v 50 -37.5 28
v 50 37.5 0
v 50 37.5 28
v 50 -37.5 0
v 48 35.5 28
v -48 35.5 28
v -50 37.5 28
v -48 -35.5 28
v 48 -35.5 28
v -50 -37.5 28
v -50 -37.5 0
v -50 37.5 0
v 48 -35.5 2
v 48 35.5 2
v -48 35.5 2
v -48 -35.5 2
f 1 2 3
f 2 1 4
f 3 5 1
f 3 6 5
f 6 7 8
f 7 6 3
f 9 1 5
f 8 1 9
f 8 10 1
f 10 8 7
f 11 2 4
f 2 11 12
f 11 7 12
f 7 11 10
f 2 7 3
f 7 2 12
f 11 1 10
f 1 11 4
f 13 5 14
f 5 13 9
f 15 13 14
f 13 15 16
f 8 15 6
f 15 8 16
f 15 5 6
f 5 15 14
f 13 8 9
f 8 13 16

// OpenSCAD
// Draft enclosure. Millimetres. Set part to "base" or "lid" before STL export.
part = "base";
length = 100;
width = 75;
wall = 2;
base_height = 28;
lid_thickness = 2;
clearance = 0.3; // Per side; adjust after printer fit test.
skirt_depth = 3;
skirt_wall = 1.2;
module base() {
    difference() {
        translate([-length/2,-width/2,0]) cube([length,width,base_height]);
        translate([-length/2+wall,-width/2+wall,wall])
            cube([length-2*wall,width-2*wall,base_height]);
    }
}
module lid() {
    sx=length-2*wall-2*clearance;
    sy=width-2*wall-2*clearance;
    union() {
        translate([-length/2,-width/2,0]) cube([length,width,lid_thickness]);
        difference() {
            translate([-sx/2,-sy/2,lid_thickness-0.01])
                cube([sx,sy,skirt_depth+0.01]);
            translate([-sx/2+skirt_wall,-sy/2+skirt_wall,lid_thickness-0.02])
                cube([sx-2*skirt_wall,sy-2*skirt_wall,skirt_depth+0.1]);
        }
    }
}
if (part == "base") base(); else lid();
